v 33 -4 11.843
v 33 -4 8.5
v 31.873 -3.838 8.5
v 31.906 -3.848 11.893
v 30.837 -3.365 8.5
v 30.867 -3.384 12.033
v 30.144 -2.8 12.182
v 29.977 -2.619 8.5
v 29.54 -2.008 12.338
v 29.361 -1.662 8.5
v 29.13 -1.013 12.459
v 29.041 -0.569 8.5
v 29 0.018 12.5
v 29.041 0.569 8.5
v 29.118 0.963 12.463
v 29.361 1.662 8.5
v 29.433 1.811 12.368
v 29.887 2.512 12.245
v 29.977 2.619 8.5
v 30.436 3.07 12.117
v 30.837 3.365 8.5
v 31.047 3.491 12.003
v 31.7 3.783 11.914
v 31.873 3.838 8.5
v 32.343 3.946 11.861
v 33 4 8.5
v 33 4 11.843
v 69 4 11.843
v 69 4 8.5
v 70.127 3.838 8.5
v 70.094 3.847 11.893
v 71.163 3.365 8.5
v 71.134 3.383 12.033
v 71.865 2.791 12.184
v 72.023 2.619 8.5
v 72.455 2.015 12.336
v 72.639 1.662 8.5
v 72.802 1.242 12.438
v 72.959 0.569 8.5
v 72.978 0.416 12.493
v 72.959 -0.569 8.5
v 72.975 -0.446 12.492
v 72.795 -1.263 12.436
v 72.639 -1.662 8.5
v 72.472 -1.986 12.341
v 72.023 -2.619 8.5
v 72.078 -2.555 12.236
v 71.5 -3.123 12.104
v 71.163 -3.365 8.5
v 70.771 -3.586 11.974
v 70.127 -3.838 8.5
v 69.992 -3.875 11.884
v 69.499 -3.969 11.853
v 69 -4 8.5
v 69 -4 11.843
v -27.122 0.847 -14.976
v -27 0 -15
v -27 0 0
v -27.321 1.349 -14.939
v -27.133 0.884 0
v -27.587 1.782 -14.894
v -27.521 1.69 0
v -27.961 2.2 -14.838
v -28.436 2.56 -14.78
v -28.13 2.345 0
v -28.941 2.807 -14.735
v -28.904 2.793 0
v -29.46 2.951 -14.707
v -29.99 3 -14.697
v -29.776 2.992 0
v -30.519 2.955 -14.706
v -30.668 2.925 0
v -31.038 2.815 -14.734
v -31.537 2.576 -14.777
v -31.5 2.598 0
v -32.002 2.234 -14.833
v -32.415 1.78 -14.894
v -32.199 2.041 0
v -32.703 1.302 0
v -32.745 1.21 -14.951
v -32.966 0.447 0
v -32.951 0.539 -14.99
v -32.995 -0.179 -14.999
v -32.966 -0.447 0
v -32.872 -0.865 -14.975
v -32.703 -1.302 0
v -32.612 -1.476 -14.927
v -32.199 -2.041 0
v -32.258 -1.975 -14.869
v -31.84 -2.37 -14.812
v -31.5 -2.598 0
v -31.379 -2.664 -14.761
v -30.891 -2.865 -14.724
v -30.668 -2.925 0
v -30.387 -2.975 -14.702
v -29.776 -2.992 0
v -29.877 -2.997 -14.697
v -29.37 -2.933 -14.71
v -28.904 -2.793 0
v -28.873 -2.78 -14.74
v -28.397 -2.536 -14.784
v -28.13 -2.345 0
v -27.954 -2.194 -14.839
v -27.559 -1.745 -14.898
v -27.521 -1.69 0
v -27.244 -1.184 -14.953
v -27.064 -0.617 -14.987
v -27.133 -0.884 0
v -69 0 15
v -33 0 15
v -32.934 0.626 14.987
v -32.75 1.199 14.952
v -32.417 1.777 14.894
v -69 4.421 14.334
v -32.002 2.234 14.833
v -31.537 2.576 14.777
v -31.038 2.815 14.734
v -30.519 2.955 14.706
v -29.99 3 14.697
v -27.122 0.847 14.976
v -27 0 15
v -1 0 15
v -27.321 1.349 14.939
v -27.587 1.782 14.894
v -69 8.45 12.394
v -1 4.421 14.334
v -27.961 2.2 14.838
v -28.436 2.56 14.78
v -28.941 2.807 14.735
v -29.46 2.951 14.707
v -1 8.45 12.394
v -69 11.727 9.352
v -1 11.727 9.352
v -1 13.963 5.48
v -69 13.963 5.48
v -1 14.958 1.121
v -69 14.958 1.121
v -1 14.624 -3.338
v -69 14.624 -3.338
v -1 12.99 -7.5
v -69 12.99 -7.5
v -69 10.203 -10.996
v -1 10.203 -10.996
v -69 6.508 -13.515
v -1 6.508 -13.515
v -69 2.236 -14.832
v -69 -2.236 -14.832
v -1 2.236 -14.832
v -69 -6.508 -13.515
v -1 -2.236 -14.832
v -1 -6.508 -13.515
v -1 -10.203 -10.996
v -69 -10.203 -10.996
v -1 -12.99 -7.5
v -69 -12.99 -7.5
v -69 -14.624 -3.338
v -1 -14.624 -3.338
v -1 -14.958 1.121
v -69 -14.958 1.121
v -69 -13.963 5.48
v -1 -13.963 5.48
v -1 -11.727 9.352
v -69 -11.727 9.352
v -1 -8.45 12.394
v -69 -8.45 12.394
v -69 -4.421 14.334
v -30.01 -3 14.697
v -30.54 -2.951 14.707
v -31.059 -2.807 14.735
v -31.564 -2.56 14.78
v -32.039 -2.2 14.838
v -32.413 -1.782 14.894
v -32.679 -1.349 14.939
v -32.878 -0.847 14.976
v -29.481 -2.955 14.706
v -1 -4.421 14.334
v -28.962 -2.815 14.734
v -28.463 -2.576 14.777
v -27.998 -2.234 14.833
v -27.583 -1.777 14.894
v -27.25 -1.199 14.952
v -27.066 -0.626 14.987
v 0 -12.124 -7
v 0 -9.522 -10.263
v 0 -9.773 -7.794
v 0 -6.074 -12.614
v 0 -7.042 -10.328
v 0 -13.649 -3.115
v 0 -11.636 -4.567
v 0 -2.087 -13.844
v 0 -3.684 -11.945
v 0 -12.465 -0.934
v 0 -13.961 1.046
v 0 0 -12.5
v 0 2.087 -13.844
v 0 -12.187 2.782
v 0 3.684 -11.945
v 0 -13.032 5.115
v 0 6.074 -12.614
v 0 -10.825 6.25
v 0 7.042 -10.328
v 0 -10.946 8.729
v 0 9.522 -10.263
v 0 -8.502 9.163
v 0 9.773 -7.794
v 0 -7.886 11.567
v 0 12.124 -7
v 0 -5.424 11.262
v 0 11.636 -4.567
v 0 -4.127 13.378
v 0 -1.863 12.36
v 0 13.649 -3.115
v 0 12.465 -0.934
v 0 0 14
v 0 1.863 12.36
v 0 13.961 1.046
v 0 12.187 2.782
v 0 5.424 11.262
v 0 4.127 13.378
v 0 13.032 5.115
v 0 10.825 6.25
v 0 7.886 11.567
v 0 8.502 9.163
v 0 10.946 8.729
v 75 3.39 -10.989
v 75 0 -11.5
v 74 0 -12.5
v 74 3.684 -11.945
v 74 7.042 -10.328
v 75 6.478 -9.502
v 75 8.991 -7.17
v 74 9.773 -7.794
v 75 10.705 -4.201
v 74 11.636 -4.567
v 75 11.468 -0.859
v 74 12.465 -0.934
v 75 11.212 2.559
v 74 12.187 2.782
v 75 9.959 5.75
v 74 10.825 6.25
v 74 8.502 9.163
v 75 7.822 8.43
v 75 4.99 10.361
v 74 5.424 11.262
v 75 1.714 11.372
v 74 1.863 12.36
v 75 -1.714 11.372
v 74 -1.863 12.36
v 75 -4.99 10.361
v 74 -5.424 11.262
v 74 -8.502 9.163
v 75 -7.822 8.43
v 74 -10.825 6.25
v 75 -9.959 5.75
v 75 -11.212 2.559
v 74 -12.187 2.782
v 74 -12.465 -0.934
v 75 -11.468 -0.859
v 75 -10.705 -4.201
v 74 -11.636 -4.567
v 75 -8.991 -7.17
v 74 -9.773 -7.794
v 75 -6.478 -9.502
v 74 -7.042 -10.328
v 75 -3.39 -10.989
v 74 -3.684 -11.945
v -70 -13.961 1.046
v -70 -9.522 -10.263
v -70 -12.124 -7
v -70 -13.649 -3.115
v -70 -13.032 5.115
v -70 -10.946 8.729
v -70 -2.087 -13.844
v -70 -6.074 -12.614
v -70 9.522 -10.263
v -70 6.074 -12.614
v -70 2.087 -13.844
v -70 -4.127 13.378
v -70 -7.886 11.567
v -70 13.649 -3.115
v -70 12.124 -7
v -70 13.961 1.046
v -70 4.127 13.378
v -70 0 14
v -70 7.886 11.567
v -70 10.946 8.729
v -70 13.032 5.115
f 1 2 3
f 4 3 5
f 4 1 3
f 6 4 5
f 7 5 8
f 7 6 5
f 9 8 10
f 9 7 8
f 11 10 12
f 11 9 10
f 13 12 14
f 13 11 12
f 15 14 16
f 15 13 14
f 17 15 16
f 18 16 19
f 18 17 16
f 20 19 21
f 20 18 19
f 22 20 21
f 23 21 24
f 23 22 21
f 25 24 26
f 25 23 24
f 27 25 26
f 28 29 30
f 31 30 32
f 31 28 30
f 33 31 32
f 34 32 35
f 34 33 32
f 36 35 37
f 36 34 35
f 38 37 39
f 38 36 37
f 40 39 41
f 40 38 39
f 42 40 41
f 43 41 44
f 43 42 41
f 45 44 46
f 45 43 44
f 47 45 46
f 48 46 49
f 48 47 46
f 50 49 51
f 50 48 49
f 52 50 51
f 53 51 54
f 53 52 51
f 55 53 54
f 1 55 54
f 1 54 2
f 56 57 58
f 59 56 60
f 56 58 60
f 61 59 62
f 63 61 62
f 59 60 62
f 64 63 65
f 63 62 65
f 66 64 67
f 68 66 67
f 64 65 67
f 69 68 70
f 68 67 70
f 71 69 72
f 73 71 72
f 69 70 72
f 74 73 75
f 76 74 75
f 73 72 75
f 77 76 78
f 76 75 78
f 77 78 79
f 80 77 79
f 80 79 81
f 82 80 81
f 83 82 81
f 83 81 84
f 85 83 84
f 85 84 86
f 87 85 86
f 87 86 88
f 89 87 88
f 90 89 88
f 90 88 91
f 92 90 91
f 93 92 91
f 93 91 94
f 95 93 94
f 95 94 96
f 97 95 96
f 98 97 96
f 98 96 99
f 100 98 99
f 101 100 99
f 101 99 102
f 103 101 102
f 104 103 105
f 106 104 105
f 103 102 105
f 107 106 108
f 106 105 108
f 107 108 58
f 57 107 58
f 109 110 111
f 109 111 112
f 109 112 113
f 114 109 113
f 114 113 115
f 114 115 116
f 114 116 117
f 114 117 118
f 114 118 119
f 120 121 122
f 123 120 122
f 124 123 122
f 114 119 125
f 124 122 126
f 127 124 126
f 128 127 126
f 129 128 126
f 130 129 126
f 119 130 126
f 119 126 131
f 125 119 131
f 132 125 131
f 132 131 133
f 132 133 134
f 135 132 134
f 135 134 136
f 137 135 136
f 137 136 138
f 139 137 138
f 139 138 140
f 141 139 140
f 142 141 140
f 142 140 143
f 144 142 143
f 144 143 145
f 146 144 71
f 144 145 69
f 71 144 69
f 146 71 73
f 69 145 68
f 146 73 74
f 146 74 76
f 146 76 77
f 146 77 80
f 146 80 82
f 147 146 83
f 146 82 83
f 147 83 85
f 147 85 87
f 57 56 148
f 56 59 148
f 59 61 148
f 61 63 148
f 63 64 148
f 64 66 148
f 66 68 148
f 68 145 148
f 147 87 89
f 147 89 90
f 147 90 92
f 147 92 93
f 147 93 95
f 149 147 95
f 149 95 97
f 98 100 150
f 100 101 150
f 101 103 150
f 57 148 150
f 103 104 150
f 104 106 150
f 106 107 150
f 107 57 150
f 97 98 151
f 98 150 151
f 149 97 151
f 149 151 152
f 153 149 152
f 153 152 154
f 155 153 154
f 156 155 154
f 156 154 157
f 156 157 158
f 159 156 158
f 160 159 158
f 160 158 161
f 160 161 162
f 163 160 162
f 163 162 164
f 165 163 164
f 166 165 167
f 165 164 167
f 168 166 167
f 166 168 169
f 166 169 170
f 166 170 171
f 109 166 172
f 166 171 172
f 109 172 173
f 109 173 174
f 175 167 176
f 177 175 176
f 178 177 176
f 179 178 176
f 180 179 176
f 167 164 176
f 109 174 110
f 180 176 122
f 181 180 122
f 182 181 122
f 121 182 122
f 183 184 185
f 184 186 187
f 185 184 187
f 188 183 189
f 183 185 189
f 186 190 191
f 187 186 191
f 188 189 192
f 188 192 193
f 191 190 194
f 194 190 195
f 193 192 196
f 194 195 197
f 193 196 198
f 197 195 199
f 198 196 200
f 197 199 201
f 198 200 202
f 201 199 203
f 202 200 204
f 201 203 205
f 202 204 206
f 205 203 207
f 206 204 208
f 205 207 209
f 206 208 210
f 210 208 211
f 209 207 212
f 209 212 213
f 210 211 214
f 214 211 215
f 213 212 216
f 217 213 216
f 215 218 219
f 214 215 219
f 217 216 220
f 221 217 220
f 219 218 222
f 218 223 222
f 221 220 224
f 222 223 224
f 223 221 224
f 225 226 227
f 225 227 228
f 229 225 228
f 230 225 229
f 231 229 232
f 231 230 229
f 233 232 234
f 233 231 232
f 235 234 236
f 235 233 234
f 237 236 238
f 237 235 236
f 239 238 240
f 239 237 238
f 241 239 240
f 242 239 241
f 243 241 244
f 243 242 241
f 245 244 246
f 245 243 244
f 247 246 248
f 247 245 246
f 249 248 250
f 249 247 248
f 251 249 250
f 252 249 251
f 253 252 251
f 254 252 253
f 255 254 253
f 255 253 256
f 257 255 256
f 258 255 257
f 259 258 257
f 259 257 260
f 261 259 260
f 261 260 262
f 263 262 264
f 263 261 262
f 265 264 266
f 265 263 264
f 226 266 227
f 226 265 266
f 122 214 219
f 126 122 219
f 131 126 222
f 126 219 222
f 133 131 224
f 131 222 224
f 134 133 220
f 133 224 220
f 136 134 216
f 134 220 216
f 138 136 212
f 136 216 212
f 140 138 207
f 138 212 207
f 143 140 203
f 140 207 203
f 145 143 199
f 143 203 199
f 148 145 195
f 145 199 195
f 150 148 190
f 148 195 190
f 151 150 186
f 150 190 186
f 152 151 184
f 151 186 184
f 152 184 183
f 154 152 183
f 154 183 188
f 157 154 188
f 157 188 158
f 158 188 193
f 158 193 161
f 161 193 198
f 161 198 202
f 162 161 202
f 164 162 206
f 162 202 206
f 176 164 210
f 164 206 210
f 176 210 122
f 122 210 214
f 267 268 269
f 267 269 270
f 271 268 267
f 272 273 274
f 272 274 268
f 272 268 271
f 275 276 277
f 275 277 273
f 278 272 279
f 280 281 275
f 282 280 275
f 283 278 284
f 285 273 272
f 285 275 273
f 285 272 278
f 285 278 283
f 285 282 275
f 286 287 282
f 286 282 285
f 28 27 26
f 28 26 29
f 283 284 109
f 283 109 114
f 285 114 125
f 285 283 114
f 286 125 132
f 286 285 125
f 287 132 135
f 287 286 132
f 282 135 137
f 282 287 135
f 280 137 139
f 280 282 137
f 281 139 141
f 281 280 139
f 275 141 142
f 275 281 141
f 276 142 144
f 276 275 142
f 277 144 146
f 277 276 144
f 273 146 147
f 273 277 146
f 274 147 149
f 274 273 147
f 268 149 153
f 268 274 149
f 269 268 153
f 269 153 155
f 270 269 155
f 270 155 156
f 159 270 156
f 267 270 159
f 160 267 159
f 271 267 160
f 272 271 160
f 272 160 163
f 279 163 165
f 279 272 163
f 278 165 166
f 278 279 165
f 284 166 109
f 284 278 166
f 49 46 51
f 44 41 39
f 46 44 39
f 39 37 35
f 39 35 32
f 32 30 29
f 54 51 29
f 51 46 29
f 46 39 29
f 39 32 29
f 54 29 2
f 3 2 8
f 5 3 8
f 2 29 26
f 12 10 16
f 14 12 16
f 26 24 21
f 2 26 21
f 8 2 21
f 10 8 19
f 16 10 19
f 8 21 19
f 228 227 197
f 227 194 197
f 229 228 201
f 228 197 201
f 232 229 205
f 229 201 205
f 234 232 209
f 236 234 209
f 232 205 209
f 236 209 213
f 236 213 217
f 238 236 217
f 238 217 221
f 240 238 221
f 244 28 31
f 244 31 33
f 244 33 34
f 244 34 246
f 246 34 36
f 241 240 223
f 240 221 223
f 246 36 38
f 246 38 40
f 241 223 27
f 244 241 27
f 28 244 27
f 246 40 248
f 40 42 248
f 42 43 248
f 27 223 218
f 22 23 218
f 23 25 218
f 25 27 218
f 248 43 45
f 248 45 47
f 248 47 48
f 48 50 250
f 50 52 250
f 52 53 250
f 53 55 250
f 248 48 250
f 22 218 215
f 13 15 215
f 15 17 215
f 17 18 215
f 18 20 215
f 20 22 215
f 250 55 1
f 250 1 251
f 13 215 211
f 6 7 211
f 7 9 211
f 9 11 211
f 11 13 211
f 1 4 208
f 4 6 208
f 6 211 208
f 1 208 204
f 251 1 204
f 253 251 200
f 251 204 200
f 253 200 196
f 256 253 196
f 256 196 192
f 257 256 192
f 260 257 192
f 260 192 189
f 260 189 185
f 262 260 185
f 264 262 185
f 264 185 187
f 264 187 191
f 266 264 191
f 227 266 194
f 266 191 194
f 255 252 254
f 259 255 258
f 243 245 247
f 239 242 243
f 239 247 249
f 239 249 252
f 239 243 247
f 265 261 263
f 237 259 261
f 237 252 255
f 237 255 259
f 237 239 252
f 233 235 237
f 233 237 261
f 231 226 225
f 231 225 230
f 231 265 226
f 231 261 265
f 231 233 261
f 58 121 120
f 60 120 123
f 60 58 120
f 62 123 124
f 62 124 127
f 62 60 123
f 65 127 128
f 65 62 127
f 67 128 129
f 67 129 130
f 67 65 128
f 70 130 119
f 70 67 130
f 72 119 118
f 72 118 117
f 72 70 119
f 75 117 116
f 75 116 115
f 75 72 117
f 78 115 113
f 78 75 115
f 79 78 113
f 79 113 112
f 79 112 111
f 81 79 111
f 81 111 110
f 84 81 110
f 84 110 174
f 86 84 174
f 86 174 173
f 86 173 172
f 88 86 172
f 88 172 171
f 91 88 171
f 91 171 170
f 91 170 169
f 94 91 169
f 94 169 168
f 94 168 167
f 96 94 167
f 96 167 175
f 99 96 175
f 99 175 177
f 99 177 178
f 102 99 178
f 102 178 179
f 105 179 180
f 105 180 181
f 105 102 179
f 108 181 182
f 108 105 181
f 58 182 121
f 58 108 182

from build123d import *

# Parameters (mm, degrees)
SKETCH_1_R               = 12.5
EXTRUDE_1_DEPTH          = 75
SKETCH_2_R               = 15
EXTRUDE_2_DEPTH          = 70
CHAMFER_1_SIZE           = 1
CUT_EXTRUDE_1_DEPTH      = 4
SKETCH_4_R               = 3
CUT_EXTRUDE_2_DEPTH      = 16
CUT_EXTRUDE_2_DEPTH_BACK = 16


with BuildPart() as part:
    # 草图1 → 凸台-拉伸1 (new body)
    with BuildSketch(Plane(origin=(0, 0, 0), x_dir=(0, 0, -1), z_dir=(1, 0, 0))):
        Circle(SKETCH_1_R)
    extrude(amount=EXTRUDE_1_DEPTH)

    # 草图2 → 凸台-拉伸2 (add)
    with BuildSketch(Plane.ZY):
        Circle(SKETCH_2_R)
    extrude(amount=EXTRUDE_2_DEPTH)

    # 倒角1
    chamfer_1_edges = [part.edges().sort_by_distance(p)[0] for p in [
        (75, 0, 12.5),
        (0, 0, -15),
        (-70, 0, -15),
    ]]
    chamfer(chamfer_1_edges, length=CHAMFER_1_SIZE)

    # 草图3 → 切除-拉伸1 (cut)
    with BuildSketch(Plane.XY.offset(12.5)):
        with BuildLine():
            Line((32.999999837, 4), (68.999998276, 4))
            ThreePointArc((68.999998276, 4), (73, 5.01e-07), (68.999999277, -4))
            Line((68.999999277, -4), (33.000000086, -4))
            ThreePointArc((33.000000086, -4), (29, -1.25e-07), (32.999999837, 4))
        make_face()
    extrude(amount=-CUT_EXTRUDE_1_DEPTH, mode=Mode.SUBTRACT)

    # 草图4 → 切除-拉伸2 (cut, two sides)
    with BuildSketch(Plane.XY) as cut_extrude_2_sk:
        with Locations((-30, 0)):
            Circle(SKETCH_4_R)
    extrude(amount=CUT_EXTRUDE_2_DEPTH, mode=Mode.SUBTRACT)
    extrude(cut_extrude_2_sk.sketch, amount=-CUT_EXTRUDE_2_DEPTH_BACK, mode=Mode.SUBTRACT)


solid = part.part
